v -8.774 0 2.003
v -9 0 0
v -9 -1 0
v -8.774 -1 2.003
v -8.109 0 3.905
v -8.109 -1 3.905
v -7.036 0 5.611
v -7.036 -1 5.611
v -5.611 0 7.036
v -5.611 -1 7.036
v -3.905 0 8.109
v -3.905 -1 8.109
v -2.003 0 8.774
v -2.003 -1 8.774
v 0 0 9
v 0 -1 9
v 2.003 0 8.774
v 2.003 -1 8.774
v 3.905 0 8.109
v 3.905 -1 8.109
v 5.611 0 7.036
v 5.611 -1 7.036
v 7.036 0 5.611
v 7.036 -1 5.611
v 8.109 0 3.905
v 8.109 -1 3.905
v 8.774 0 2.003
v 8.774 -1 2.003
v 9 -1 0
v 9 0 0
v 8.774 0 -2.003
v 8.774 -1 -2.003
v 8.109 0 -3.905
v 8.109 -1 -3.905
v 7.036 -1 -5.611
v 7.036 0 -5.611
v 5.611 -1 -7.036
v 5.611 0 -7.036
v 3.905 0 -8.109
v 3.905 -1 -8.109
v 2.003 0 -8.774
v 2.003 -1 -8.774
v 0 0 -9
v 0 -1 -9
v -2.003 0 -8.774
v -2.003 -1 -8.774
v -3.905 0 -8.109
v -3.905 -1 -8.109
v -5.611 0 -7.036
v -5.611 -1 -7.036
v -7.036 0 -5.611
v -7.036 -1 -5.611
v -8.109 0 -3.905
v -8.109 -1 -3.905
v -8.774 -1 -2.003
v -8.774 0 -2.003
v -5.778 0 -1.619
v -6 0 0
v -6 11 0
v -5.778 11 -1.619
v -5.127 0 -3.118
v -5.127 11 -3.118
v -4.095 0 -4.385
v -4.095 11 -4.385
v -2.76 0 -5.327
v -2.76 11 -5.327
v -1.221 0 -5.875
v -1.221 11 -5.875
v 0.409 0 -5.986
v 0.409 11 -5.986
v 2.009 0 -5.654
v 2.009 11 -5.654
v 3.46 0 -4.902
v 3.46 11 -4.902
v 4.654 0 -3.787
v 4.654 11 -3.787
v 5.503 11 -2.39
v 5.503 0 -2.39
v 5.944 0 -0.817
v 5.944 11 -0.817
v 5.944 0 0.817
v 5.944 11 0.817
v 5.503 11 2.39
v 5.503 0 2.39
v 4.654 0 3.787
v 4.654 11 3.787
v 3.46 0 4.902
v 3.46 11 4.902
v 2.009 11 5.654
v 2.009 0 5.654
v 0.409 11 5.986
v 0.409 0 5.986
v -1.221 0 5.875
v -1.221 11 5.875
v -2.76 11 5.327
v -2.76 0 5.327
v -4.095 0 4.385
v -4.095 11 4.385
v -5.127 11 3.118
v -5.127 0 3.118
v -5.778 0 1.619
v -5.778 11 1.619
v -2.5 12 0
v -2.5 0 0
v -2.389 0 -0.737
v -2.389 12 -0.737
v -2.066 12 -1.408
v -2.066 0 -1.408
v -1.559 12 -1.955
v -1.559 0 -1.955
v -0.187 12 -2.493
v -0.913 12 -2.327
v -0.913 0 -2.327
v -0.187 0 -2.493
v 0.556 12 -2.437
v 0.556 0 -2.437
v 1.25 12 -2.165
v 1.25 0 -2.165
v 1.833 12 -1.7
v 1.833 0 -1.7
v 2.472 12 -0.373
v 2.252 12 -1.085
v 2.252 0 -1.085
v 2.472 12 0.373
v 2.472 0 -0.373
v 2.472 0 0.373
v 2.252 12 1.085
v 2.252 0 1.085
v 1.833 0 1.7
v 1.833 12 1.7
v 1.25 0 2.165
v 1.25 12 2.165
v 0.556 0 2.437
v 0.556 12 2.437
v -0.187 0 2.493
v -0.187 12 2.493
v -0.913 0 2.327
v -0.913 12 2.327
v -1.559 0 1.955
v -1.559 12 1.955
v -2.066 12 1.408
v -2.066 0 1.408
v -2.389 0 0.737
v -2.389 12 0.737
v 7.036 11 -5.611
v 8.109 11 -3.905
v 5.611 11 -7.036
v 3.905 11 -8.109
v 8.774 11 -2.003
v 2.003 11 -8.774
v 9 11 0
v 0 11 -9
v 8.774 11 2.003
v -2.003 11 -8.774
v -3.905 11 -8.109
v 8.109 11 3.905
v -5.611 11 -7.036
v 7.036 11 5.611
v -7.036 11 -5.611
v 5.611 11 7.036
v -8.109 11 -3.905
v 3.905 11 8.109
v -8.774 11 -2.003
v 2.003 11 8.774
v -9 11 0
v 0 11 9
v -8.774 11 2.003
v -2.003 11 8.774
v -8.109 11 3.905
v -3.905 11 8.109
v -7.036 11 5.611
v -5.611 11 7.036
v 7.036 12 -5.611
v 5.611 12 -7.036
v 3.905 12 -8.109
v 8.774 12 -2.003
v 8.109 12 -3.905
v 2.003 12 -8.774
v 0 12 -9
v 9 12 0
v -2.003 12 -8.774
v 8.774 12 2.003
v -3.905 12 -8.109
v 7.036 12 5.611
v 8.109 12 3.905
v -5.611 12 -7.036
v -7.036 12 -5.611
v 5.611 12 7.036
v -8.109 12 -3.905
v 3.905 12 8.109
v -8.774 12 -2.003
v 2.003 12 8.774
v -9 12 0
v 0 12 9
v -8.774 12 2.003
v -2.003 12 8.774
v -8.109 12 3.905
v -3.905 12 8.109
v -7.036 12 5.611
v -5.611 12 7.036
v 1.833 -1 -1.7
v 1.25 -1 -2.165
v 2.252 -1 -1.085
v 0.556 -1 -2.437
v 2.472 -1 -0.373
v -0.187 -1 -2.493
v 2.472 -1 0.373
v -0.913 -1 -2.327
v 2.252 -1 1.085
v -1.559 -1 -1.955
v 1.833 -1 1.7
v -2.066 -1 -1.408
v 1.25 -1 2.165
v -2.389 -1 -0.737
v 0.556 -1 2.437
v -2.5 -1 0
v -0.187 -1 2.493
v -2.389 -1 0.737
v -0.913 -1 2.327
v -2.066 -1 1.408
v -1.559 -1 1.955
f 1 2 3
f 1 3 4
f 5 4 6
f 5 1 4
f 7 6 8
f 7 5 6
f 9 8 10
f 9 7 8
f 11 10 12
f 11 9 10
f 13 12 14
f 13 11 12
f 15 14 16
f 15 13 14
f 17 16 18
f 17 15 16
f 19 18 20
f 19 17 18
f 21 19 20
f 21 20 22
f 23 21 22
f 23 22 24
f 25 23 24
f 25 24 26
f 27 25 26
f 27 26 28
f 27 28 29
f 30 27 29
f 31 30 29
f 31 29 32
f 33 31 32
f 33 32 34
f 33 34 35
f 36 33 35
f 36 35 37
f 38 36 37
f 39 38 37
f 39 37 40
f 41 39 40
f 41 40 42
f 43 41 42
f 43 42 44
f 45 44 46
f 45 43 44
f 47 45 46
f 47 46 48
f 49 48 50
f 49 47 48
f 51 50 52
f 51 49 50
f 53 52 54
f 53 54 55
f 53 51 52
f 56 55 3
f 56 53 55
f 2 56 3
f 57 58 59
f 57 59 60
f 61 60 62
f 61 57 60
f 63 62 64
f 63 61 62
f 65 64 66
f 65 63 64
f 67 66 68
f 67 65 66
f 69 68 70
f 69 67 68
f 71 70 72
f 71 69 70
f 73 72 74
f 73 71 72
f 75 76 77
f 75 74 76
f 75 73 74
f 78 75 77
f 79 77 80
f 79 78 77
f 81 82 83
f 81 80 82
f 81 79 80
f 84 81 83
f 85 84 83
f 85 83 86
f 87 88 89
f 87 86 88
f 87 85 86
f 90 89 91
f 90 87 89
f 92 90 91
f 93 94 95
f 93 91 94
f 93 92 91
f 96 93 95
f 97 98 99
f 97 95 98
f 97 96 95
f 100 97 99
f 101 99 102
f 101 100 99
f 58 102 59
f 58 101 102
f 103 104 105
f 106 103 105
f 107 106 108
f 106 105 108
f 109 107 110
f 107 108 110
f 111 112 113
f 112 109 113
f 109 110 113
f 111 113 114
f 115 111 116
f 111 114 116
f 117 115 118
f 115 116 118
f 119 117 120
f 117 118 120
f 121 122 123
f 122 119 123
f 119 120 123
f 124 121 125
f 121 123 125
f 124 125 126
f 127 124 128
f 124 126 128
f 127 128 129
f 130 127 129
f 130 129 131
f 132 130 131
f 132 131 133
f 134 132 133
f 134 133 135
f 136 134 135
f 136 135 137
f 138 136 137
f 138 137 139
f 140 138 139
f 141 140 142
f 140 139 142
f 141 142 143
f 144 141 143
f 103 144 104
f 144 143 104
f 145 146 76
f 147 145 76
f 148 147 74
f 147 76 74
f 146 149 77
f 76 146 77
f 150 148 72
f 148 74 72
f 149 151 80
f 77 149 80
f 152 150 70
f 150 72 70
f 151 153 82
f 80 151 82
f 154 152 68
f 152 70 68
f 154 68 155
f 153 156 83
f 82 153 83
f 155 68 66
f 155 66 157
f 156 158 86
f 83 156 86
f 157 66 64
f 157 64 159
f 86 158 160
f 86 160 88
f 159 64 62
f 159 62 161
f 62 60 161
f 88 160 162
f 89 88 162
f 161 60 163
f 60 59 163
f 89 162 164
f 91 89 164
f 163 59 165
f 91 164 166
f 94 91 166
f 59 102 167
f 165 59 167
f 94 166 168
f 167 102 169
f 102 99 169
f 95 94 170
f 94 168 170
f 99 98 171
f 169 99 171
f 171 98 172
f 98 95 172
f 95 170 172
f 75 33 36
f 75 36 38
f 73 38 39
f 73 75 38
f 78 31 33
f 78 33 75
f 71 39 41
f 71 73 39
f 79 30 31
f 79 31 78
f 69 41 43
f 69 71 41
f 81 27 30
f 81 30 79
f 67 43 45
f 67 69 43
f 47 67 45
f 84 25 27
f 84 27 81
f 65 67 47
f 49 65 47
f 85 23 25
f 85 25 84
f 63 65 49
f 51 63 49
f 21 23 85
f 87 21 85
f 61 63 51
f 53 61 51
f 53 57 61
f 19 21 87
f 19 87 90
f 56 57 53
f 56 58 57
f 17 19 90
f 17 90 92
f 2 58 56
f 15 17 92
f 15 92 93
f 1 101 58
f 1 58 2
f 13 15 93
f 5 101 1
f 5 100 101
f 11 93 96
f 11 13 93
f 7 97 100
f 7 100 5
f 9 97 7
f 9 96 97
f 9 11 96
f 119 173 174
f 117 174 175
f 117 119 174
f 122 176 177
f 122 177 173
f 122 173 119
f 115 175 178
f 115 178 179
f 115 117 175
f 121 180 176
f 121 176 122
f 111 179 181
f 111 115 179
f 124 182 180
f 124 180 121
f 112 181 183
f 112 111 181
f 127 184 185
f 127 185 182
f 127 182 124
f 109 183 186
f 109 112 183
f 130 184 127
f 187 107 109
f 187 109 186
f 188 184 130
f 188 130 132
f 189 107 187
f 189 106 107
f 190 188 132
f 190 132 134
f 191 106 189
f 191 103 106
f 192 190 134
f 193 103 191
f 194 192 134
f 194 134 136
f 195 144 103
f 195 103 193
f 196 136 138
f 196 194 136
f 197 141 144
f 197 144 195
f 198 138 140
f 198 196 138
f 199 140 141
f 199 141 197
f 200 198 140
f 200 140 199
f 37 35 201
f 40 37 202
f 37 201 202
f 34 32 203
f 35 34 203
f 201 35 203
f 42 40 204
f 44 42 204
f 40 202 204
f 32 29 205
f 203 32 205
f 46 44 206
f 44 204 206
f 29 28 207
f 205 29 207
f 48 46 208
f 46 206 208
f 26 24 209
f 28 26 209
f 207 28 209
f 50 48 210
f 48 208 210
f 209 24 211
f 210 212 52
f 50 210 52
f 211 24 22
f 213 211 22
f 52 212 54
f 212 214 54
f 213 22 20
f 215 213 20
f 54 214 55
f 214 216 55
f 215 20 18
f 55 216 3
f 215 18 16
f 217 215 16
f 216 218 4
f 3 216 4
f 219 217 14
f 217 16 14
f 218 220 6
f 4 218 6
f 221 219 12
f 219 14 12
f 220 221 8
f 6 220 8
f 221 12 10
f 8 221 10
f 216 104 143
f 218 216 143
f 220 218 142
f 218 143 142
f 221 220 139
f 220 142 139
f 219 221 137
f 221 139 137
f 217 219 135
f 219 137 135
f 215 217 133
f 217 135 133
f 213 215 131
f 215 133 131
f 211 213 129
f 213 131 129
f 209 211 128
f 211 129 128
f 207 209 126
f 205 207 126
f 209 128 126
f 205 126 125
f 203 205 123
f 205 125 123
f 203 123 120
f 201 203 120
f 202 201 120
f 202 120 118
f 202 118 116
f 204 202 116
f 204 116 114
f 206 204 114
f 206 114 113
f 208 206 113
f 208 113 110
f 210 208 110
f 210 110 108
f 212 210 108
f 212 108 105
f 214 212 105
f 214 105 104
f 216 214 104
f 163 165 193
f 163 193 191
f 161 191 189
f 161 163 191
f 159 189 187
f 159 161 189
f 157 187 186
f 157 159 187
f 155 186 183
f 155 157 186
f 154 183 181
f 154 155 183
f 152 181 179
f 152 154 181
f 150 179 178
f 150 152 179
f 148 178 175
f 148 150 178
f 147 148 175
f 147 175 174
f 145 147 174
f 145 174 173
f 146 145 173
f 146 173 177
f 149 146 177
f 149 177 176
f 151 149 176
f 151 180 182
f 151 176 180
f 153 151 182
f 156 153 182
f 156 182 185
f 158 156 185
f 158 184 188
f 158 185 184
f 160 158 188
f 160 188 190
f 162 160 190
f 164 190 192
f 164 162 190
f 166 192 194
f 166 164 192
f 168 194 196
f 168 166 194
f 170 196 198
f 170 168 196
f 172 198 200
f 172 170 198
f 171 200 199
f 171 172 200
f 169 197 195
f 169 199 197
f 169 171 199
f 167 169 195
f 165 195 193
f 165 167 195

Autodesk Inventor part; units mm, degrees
ref_plane "YZ Plane" through (0, 0, 0) normal (1, 0, 0) x (0, 1, 0)
ref_plane "XZ Plane" through (0, 0, 0) normal (0, 1, 0) x (-1, 0, 0)
ref_plane "XY Plane" through (0, 0, 0) normal (0, 0, 1) x (1, 0, 0)
sketch "Sketch1" plane through (0, 0, 0) normal (0, 1, 0) x (-1, 0, 0)
  circle A0 centre (0, 0) radius 2.5
  circle A1 centre (0, 0) radius 9
  circle A2 centre (0, 0) radius 6
  dimension "d0" = 5
  dimension "d1" = 18
  dimension "d2" = 12
extrude "Extrusion1" add sketch "Sketch1" along normal blind 11 contours A2
extrude "Extrusion2" add sketch "Sketch1" along normal blind 1 from surface at 11 contours A1 | A2
extrude "Extrusion3" add sketch "Sketch1" against normal blind 1 contours A1 | A2
properties part number "Idler"
